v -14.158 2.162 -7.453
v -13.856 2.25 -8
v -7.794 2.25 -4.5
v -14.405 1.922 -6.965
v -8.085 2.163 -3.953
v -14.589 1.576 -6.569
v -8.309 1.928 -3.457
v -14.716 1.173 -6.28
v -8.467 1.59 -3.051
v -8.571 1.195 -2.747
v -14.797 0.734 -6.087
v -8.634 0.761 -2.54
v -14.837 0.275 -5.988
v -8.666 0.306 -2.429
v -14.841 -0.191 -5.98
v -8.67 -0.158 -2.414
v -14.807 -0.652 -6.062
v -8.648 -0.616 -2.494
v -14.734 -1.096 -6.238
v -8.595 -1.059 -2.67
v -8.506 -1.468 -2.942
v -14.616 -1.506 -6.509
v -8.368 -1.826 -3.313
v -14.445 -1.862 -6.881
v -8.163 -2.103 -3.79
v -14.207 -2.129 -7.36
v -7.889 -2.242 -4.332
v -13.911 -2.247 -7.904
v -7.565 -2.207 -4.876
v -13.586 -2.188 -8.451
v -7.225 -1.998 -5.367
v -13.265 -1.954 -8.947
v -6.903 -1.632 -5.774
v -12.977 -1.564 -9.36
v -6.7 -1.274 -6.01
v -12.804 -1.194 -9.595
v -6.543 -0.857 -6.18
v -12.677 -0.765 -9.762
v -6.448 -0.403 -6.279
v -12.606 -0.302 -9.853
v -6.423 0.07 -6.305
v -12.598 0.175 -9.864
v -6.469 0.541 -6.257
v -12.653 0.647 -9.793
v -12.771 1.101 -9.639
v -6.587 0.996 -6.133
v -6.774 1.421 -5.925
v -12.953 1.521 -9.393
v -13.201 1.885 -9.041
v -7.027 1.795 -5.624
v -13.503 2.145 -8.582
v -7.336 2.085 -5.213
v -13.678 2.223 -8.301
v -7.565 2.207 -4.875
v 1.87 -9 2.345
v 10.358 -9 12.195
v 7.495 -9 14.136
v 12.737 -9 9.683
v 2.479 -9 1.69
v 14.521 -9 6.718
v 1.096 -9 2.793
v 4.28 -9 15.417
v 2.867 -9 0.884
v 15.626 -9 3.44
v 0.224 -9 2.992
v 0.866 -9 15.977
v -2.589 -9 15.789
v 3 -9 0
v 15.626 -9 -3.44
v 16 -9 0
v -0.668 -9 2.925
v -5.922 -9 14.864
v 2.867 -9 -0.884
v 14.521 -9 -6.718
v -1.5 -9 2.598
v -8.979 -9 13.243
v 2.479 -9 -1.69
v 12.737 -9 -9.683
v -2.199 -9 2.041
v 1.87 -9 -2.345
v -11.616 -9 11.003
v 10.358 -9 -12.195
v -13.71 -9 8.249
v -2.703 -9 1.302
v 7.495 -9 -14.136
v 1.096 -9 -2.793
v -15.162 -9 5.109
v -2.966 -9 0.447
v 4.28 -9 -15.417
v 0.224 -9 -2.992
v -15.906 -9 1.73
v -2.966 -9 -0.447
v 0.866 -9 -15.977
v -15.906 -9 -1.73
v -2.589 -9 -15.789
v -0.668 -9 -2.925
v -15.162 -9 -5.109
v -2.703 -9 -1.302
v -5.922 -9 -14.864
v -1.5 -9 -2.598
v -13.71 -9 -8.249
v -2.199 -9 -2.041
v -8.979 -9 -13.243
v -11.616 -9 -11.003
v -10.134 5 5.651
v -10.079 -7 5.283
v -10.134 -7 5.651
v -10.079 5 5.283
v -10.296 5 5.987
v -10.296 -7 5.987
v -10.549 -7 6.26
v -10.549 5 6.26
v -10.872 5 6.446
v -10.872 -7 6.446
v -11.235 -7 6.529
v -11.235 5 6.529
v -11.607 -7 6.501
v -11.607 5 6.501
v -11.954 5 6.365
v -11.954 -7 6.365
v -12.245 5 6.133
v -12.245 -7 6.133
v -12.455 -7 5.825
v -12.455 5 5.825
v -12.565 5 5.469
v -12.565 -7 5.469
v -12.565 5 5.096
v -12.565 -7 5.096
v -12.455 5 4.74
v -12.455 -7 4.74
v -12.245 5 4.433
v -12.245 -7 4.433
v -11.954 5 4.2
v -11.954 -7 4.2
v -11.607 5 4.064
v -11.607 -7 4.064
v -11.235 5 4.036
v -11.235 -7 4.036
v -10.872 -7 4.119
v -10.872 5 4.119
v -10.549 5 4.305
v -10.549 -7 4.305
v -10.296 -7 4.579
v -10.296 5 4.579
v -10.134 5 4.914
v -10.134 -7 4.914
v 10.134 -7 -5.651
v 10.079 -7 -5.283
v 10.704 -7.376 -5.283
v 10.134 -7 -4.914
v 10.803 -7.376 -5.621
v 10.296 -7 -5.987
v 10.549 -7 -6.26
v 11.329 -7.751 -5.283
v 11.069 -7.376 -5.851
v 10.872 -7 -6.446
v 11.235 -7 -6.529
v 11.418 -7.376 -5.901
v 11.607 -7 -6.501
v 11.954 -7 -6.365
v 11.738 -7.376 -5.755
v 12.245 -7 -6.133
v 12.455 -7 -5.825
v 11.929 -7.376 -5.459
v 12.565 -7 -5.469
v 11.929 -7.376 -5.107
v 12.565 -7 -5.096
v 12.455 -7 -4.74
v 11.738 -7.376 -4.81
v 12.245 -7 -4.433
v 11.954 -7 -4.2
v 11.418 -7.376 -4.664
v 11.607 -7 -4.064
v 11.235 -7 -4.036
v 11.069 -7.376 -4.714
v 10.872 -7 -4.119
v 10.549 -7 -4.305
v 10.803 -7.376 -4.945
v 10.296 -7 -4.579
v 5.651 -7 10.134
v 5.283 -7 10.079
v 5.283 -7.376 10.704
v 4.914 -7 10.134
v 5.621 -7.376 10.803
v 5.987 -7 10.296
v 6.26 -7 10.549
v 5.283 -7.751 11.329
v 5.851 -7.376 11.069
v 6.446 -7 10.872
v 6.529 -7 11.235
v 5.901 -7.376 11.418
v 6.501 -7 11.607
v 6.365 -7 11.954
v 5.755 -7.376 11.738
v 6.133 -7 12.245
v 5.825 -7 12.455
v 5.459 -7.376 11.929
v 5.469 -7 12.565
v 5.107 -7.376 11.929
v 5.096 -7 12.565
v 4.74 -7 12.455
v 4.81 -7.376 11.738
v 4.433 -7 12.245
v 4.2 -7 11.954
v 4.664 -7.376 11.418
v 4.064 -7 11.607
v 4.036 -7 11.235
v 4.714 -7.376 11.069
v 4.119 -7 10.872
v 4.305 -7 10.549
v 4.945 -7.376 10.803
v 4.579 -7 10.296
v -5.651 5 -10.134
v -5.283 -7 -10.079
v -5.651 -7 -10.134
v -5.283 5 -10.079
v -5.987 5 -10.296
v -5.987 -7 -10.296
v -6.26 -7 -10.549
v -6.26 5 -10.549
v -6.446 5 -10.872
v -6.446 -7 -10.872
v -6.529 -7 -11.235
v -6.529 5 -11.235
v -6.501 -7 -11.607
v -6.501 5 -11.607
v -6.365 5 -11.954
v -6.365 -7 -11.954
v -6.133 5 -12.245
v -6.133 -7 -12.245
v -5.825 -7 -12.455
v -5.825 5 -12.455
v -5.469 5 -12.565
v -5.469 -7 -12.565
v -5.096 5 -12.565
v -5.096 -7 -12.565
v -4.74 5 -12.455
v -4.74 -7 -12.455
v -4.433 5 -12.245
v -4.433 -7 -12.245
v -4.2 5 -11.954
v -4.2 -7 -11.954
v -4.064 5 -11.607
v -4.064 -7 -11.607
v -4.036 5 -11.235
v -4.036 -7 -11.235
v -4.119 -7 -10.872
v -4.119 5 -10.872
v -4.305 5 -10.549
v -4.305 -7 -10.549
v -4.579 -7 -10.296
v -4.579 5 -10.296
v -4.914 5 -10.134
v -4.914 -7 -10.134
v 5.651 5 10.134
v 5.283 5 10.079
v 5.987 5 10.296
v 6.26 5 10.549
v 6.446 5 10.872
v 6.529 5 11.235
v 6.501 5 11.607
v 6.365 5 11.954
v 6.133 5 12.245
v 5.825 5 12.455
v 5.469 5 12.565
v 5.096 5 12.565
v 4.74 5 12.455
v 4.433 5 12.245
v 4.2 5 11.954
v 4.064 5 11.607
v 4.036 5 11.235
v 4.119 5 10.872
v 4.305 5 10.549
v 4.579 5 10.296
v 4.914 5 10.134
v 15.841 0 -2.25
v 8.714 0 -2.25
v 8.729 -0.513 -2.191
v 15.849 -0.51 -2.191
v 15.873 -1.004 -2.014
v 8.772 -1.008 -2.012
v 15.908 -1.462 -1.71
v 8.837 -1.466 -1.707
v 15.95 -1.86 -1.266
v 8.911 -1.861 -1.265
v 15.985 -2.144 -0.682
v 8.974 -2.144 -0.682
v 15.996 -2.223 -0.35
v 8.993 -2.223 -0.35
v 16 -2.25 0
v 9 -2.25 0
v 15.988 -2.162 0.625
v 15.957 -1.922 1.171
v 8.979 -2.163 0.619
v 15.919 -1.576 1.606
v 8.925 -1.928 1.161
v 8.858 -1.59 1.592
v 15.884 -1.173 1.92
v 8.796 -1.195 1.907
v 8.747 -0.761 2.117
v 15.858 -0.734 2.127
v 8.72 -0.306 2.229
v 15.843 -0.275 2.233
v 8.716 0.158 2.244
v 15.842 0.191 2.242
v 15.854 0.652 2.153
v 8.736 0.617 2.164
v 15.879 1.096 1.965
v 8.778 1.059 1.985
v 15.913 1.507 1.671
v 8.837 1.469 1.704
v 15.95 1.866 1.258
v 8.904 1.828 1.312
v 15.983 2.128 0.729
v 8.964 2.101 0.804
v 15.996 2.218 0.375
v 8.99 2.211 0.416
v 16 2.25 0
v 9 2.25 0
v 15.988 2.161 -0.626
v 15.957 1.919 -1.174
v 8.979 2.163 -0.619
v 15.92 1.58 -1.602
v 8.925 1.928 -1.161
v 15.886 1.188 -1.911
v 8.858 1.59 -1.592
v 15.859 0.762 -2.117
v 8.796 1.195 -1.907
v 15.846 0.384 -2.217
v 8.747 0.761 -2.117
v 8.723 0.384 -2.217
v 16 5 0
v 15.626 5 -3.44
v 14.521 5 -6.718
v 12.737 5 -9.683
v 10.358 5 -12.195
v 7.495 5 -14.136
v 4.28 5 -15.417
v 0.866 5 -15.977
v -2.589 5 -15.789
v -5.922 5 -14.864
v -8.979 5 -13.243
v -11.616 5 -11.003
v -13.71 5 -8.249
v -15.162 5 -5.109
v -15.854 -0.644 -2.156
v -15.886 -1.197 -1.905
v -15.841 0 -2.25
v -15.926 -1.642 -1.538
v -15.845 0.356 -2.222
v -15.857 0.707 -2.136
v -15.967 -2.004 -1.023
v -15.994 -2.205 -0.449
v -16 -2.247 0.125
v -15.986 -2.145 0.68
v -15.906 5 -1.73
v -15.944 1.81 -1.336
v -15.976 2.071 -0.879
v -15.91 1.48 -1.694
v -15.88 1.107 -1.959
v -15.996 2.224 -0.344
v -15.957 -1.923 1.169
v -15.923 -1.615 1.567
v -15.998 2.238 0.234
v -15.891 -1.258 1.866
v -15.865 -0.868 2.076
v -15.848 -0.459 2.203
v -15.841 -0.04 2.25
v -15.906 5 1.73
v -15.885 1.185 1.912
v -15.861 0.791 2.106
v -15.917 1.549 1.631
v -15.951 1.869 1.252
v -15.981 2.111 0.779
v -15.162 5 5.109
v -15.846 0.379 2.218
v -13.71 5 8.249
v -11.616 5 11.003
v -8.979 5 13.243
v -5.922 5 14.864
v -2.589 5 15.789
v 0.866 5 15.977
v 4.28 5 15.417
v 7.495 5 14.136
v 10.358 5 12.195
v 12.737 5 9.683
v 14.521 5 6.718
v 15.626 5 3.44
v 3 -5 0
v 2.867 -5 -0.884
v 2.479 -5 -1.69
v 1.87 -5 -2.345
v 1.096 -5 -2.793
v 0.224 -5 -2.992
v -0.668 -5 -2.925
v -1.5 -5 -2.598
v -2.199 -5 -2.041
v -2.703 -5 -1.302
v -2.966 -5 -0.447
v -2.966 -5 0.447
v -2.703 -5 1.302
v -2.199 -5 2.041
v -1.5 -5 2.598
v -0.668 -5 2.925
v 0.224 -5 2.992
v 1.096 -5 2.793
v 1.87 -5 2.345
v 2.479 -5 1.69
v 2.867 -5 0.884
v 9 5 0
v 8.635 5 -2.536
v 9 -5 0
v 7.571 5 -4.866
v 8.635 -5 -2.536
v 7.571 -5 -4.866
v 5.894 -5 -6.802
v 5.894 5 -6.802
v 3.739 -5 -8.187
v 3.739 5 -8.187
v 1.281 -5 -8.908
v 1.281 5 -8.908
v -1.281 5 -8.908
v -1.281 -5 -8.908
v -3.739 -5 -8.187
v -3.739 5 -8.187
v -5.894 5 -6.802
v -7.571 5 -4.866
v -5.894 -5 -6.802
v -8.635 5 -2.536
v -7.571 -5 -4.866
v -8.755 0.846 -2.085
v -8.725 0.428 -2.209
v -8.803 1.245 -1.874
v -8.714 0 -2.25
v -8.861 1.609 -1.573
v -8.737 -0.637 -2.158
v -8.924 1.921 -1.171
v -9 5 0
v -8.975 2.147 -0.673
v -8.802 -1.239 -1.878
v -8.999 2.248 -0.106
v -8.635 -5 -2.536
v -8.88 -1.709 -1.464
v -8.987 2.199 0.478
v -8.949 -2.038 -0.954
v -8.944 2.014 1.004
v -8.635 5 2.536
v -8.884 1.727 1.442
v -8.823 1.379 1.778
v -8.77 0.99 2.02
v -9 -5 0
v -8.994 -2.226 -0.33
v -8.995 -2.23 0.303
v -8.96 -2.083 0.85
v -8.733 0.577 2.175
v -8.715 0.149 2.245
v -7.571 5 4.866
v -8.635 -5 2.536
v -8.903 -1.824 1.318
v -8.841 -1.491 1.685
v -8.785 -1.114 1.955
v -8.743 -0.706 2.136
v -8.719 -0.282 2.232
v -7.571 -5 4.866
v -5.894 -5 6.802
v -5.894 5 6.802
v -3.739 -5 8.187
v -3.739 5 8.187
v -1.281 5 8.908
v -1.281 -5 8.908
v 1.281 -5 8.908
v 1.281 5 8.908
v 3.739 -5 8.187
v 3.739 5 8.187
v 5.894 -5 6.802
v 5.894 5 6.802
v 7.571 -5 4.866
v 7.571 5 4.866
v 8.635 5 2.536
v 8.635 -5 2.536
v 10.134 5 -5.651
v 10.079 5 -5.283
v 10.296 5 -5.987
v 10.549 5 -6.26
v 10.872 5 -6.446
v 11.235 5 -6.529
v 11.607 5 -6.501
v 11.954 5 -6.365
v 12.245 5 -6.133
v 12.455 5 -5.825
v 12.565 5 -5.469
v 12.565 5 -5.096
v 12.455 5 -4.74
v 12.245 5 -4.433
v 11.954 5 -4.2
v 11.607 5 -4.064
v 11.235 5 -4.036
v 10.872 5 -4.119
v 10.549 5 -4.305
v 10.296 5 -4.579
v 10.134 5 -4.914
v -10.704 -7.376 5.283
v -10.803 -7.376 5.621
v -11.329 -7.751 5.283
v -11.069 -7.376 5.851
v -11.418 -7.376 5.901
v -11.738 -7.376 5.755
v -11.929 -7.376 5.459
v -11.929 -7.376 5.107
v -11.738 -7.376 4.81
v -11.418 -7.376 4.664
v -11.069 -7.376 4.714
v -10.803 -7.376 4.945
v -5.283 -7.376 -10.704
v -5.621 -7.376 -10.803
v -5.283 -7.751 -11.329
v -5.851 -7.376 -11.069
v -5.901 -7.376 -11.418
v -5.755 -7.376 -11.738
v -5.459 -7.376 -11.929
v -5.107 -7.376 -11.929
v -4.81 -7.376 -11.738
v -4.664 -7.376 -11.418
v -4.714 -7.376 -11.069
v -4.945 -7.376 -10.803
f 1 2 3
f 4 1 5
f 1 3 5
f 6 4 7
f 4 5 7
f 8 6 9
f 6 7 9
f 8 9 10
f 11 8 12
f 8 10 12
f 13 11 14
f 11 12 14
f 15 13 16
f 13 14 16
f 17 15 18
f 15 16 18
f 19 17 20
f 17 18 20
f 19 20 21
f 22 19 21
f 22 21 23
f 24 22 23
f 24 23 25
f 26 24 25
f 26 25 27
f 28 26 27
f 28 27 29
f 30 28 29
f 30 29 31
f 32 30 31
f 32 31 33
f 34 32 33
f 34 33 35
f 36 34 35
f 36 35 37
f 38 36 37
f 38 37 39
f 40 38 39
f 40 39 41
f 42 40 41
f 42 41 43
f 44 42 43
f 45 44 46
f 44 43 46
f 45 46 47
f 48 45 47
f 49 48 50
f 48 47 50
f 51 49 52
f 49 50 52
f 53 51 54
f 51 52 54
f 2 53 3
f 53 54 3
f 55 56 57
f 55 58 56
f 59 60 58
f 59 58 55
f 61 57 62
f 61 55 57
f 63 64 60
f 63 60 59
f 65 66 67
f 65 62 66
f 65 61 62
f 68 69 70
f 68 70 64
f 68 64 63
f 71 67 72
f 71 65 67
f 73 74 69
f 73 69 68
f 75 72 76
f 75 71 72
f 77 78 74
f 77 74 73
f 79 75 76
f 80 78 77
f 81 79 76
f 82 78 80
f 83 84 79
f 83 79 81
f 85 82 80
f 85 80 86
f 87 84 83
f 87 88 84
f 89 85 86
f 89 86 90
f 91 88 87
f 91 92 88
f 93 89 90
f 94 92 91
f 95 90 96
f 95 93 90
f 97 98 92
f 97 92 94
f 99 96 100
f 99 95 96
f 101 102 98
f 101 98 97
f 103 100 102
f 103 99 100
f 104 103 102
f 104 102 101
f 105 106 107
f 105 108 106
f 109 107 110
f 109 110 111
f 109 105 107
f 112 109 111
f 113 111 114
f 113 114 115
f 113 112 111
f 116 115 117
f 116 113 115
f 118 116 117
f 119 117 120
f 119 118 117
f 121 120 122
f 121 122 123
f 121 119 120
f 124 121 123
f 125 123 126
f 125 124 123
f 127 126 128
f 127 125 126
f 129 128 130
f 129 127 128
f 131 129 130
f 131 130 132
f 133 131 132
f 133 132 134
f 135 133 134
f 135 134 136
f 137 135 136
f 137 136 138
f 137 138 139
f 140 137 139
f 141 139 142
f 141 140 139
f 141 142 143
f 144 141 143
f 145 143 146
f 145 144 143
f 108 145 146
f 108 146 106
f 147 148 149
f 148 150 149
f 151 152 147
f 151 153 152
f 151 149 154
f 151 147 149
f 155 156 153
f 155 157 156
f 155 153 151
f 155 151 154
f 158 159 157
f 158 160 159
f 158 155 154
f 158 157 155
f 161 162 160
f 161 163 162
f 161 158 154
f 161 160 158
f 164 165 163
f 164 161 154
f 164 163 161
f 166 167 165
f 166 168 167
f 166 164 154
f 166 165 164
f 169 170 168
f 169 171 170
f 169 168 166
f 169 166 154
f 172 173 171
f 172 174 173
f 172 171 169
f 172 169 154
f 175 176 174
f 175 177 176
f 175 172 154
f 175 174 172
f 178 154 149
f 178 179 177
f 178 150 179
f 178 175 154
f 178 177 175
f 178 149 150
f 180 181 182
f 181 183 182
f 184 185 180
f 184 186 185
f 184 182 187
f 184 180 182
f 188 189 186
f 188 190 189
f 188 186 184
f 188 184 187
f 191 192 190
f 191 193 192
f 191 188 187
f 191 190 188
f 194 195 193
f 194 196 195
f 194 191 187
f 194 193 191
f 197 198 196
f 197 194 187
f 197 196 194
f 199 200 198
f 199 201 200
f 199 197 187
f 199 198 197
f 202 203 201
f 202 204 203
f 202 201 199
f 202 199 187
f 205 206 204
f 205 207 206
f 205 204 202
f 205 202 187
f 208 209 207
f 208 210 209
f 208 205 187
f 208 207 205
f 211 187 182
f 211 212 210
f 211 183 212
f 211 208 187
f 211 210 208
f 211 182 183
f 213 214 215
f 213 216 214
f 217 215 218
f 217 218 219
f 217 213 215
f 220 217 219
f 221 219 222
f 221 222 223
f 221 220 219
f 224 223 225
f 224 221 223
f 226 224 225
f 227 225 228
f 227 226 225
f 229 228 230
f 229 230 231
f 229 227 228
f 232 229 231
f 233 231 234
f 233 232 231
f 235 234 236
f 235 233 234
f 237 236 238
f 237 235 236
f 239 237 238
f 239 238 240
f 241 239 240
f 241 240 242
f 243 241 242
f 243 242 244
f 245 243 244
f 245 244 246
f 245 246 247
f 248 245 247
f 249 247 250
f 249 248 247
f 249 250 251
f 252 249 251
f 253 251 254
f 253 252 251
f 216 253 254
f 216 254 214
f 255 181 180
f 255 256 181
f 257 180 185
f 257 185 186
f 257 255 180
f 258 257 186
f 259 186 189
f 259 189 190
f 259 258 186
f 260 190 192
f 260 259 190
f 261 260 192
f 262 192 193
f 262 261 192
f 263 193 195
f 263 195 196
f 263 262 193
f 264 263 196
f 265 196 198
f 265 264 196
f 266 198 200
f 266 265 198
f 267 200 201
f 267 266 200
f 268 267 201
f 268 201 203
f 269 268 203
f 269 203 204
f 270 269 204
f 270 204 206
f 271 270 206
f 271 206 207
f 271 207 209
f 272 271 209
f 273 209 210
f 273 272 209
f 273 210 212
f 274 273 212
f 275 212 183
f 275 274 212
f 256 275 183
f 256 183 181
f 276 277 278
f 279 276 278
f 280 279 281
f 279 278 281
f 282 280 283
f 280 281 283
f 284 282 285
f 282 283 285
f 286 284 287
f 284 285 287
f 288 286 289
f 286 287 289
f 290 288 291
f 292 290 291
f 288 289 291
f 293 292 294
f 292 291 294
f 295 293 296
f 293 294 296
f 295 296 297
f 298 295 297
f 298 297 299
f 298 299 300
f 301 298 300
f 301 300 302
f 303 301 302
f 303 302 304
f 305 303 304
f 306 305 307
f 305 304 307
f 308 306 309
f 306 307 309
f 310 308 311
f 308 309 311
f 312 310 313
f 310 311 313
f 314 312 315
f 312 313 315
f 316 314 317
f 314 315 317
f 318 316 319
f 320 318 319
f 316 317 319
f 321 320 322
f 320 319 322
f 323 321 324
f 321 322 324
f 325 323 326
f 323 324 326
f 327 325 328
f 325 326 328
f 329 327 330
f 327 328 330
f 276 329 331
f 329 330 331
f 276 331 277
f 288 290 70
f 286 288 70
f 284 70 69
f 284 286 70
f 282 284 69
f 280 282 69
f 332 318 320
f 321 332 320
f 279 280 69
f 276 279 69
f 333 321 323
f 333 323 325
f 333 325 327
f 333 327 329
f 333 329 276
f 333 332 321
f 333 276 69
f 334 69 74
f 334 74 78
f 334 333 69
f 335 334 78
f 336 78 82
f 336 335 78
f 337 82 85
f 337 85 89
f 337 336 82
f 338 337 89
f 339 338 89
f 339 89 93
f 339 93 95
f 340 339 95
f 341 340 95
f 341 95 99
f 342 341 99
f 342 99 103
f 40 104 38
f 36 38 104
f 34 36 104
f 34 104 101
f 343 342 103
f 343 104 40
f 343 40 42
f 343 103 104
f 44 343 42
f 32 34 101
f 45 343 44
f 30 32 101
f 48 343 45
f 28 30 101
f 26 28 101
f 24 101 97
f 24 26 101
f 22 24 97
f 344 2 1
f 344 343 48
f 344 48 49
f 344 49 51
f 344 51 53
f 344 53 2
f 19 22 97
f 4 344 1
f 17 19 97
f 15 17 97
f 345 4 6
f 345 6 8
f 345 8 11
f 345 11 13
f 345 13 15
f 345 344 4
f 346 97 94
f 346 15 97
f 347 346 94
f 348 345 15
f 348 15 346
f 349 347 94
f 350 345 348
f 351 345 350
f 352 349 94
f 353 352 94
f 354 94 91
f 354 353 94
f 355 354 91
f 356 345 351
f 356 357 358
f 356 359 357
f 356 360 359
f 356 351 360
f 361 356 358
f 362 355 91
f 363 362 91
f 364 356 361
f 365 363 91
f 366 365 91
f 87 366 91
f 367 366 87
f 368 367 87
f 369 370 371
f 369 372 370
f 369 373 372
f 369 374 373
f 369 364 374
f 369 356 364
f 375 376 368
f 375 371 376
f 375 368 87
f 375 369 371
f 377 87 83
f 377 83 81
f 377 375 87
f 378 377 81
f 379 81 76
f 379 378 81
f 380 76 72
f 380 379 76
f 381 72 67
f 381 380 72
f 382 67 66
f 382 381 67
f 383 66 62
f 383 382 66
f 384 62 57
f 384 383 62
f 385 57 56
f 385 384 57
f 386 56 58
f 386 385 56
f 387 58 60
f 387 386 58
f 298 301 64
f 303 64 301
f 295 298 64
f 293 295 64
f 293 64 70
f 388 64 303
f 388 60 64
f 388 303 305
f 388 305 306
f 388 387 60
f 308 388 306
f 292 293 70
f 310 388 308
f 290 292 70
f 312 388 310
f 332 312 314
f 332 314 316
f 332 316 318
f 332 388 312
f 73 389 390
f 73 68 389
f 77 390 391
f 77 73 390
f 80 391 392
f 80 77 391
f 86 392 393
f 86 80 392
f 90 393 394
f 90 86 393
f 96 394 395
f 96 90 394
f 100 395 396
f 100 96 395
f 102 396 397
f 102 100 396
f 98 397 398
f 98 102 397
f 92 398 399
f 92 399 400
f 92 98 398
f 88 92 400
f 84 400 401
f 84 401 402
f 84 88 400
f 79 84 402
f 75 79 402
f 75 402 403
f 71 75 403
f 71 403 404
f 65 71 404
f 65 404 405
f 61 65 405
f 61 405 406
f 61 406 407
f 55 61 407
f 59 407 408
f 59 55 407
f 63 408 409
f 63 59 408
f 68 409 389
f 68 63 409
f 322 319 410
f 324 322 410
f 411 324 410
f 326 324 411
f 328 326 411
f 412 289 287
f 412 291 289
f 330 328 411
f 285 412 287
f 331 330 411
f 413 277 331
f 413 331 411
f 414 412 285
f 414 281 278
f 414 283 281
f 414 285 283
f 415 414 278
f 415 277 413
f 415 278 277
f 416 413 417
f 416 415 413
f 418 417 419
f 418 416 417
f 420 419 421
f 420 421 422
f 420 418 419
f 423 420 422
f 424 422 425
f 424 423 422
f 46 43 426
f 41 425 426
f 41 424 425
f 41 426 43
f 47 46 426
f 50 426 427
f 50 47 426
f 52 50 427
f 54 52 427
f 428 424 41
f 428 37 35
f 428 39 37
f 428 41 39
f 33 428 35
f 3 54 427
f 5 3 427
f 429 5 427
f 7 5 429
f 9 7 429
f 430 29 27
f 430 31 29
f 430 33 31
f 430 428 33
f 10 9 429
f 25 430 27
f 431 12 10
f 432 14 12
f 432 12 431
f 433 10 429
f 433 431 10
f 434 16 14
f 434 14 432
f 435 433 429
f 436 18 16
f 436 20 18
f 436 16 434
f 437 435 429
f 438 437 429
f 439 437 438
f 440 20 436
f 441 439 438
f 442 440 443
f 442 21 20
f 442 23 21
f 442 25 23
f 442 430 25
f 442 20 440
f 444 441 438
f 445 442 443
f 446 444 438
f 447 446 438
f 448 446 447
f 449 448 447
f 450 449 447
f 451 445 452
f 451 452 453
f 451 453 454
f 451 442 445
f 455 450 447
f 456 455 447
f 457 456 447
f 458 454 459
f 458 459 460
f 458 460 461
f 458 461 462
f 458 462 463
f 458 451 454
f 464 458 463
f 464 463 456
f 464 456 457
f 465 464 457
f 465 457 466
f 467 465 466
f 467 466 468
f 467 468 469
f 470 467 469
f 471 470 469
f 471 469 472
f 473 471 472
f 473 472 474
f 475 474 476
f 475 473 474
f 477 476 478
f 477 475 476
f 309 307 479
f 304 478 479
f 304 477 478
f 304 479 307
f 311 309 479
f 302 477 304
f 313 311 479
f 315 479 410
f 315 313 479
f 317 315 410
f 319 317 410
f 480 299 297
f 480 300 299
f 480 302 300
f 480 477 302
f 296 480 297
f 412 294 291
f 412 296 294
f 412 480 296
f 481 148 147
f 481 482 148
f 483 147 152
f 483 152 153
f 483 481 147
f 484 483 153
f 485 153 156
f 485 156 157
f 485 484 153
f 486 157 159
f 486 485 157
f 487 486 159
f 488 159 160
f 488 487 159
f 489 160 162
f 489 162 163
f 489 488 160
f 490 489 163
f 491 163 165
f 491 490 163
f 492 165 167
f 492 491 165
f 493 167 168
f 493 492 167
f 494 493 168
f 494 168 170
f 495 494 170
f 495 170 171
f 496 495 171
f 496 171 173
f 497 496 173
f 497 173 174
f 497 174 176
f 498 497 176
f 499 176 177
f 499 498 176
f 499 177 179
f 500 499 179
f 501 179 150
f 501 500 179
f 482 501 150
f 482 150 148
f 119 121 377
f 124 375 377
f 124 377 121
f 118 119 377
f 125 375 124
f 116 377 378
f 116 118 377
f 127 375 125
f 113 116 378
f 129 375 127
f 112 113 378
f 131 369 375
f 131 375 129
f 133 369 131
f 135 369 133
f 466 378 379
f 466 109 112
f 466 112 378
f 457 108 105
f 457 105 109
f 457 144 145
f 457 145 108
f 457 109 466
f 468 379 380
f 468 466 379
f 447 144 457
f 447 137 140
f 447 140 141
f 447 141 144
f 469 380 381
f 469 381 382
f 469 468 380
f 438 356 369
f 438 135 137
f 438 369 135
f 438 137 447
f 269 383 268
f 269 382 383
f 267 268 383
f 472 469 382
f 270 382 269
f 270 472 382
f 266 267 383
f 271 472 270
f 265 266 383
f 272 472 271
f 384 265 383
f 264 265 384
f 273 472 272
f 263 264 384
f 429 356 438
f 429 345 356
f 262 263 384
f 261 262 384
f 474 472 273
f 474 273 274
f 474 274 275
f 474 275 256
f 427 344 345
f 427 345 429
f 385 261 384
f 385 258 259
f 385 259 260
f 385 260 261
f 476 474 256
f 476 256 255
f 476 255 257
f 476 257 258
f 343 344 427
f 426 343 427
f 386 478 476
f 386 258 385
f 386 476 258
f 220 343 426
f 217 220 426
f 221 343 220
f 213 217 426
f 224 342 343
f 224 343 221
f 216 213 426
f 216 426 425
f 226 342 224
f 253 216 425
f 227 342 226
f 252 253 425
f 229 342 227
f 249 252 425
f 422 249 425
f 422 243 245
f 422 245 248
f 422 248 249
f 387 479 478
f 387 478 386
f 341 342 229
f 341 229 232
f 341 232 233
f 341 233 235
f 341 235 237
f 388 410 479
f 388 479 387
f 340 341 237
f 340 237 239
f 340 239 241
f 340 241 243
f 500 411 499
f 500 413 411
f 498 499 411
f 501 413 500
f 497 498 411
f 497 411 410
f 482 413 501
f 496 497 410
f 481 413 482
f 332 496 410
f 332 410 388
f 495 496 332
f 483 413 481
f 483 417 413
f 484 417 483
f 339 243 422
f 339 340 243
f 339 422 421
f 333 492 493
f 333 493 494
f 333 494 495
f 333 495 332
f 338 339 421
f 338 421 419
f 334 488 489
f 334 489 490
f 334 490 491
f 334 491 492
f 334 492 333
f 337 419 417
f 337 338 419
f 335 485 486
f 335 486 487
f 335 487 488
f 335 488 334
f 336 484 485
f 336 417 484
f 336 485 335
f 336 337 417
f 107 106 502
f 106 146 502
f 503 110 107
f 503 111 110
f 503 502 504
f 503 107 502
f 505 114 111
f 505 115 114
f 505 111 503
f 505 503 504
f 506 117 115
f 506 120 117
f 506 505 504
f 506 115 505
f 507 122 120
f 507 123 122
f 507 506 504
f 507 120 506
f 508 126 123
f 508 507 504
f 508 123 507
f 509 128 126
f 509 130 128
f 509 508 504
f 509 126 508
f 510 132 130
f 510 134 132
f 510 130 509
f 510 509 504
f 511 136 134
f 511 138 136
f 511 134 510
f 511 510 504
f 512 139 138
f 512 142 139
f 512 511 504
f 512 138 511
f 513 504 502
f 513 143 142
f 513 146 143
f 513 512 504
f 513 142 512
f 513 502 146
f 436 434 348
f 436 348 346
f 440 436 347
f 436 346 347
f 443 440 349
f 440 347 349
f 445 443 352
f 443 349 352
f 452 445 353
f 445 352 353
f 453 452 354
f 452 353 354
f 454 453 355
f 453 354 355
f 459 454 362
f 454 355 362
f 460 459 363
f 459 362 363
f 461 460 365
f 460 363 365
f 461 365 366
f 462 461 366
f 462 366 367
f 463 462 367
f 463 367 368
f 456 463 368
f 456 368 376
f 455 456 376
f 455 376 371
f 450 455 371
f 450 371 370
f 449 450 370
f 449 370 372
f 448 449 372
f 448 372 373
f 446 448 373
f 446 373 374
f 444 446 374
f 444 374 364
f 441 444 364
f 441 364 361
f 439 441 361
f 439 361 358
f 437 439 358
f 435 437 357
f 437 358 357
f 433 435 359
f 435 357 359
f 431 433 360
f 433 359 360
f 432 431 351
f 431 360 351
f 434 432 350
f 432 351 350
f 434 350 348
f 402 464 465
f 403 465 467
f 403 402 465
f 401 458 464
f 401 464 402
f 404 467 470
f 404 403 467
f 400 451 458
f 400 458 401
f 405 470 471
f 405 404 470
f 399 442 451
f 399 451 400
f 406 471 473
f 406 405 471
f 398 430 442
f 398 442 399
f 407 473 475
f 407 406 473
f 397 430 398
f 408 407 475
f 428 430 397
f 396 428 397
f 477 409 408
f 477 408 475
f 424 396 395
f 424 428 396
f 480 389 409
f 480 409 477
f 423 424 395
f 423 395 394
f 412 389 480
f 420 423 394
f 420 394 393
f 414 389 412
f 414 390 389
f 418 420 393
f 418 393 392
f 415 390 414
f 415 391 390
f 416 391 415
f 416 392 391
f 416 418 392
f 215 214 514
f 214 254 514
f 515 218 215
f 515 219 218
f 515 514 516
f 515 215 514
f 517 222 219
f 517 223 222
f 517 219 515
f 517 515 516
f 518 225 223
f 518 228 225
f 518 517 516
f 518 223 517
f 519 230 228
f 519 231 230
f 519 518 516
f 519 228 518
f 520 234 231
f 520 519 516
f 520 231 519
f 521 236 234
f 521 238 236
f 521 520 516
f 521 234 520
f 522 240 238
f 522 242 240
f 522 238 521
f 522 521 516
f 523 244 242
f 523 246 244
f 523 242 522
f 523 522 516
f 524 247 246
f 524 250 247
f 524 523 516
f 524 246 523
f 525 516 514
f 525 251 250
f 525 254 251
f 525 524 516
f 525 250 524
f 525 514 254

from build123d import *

# Parameters (mm, degrees)
F_4_5_4_5_DIAMETER_HOLE1_D           = 4.5
F_4_5_4_5_DIAMETER_HOLE1_ON_FACE_2_D = 4.5
F_4_5_4_5_DIAMETER_HOLE2_D           = 4.5
F_4_5_4_5_DIAMETER_HOLE2_DEPTH       = 18
F_4_5_4_5_DIAMETER_HOLE2_TIP         = 1.351936393
CIRPATTERN1_COUNT                    = 4


with BuildPart() as part:
    # Esboço1 → Revolução1 (revolve)
    with BuildSketch(Plane.XY):
        Polygon((3, -9), (16, -9), (16, 5), (9, 5), (9, -5), (3, -5), align=None)
    revolve(axis=Axis((0, -9, 0), (0, 1, 0)))

    # Ø4.5 (4.5) Diameter Hole1 (through all)
    with Locations(Plane(origin=(16, 0, 0), x_dir=(0, 0, 1), z_dir=(1, 0, 0))):
        with Locations((0, 0)):
            Hole(F_4_5_4_5_DIAMETER_HOLE1_D / 2)

    # Ø4.5 (4.5) Diameter Hole1 on face 2 (through all)
    with Locations(Plane(origin=(0, 0, 0), x_dir=(0, 0, 1), z_dir=(1, 0, 0))):
        with Locations((0, 0)):
            Hole(F_4_5_4_5_DIAMETER_HOLE1_ON_FACE_2_D / 2)

    # Ø4.5 (4.5) Diameter Hole2
    with Locations(Plane(origin=(-13.856406461, 0, -8), x_dir=(0, -1, 0), z_dir=(-0.8660254037844364, 0, -0.5000000000000041))):
        with Locations((0, 0)):
            Hole(F_4_5_4_5_DIAMETER_HOLE2_D / 2, depth=F_4_5_4_5_DIAMETER_HOLE2_DEPTH)
            with Locations((0, 0, -(F_4_5_4_5_DIAMETER_HOLE2_DEPTH + F_4_5_4_5_DIAMETER_HOLE2_TIP / 2))):  # 118° drill point
                Cone(0, F_4_5_4_5_DIAMETER_HOLE2_D / 2, F_4_5_4_5_DIAMETER_HOLE2_TIP, mode=Mode.SUBTRACT)

    # Sketch1 → M3x0.5 Tapped Hole1 (revolve, cut)
    with BuildSketch(Plane(origin=(-5.282728272, 5, -11.328847338), x_dir=(0, 0, 1), z_dir=(1, 0, 0))):
        Polygon((0, 0), (0, 12.751075774), (1.25, 12), (1.25, 0), align=None)
    m3x0_5_tapped_hole1 = revolve(axis=Axis((-5.282728272, 11.35, -11.328847338), (0, -1, 0)), mode=Mode.SUBTRACT)

    # CirPattern1: M3x0.5 Tapped Hole1 ×4 about axis
    cirpattern1_axis = Axis((0, 0, 0), (0, -1, 0))
    for i in range(1, CIRPATTERN1_COUNT):
        add(m3x0_5_tapped_hole1.rotate(cirpattern1_axis, i * 360 / CIRPATTERN1_COUNT), mode=Mode.SUBTRACT)


solid = part.part
